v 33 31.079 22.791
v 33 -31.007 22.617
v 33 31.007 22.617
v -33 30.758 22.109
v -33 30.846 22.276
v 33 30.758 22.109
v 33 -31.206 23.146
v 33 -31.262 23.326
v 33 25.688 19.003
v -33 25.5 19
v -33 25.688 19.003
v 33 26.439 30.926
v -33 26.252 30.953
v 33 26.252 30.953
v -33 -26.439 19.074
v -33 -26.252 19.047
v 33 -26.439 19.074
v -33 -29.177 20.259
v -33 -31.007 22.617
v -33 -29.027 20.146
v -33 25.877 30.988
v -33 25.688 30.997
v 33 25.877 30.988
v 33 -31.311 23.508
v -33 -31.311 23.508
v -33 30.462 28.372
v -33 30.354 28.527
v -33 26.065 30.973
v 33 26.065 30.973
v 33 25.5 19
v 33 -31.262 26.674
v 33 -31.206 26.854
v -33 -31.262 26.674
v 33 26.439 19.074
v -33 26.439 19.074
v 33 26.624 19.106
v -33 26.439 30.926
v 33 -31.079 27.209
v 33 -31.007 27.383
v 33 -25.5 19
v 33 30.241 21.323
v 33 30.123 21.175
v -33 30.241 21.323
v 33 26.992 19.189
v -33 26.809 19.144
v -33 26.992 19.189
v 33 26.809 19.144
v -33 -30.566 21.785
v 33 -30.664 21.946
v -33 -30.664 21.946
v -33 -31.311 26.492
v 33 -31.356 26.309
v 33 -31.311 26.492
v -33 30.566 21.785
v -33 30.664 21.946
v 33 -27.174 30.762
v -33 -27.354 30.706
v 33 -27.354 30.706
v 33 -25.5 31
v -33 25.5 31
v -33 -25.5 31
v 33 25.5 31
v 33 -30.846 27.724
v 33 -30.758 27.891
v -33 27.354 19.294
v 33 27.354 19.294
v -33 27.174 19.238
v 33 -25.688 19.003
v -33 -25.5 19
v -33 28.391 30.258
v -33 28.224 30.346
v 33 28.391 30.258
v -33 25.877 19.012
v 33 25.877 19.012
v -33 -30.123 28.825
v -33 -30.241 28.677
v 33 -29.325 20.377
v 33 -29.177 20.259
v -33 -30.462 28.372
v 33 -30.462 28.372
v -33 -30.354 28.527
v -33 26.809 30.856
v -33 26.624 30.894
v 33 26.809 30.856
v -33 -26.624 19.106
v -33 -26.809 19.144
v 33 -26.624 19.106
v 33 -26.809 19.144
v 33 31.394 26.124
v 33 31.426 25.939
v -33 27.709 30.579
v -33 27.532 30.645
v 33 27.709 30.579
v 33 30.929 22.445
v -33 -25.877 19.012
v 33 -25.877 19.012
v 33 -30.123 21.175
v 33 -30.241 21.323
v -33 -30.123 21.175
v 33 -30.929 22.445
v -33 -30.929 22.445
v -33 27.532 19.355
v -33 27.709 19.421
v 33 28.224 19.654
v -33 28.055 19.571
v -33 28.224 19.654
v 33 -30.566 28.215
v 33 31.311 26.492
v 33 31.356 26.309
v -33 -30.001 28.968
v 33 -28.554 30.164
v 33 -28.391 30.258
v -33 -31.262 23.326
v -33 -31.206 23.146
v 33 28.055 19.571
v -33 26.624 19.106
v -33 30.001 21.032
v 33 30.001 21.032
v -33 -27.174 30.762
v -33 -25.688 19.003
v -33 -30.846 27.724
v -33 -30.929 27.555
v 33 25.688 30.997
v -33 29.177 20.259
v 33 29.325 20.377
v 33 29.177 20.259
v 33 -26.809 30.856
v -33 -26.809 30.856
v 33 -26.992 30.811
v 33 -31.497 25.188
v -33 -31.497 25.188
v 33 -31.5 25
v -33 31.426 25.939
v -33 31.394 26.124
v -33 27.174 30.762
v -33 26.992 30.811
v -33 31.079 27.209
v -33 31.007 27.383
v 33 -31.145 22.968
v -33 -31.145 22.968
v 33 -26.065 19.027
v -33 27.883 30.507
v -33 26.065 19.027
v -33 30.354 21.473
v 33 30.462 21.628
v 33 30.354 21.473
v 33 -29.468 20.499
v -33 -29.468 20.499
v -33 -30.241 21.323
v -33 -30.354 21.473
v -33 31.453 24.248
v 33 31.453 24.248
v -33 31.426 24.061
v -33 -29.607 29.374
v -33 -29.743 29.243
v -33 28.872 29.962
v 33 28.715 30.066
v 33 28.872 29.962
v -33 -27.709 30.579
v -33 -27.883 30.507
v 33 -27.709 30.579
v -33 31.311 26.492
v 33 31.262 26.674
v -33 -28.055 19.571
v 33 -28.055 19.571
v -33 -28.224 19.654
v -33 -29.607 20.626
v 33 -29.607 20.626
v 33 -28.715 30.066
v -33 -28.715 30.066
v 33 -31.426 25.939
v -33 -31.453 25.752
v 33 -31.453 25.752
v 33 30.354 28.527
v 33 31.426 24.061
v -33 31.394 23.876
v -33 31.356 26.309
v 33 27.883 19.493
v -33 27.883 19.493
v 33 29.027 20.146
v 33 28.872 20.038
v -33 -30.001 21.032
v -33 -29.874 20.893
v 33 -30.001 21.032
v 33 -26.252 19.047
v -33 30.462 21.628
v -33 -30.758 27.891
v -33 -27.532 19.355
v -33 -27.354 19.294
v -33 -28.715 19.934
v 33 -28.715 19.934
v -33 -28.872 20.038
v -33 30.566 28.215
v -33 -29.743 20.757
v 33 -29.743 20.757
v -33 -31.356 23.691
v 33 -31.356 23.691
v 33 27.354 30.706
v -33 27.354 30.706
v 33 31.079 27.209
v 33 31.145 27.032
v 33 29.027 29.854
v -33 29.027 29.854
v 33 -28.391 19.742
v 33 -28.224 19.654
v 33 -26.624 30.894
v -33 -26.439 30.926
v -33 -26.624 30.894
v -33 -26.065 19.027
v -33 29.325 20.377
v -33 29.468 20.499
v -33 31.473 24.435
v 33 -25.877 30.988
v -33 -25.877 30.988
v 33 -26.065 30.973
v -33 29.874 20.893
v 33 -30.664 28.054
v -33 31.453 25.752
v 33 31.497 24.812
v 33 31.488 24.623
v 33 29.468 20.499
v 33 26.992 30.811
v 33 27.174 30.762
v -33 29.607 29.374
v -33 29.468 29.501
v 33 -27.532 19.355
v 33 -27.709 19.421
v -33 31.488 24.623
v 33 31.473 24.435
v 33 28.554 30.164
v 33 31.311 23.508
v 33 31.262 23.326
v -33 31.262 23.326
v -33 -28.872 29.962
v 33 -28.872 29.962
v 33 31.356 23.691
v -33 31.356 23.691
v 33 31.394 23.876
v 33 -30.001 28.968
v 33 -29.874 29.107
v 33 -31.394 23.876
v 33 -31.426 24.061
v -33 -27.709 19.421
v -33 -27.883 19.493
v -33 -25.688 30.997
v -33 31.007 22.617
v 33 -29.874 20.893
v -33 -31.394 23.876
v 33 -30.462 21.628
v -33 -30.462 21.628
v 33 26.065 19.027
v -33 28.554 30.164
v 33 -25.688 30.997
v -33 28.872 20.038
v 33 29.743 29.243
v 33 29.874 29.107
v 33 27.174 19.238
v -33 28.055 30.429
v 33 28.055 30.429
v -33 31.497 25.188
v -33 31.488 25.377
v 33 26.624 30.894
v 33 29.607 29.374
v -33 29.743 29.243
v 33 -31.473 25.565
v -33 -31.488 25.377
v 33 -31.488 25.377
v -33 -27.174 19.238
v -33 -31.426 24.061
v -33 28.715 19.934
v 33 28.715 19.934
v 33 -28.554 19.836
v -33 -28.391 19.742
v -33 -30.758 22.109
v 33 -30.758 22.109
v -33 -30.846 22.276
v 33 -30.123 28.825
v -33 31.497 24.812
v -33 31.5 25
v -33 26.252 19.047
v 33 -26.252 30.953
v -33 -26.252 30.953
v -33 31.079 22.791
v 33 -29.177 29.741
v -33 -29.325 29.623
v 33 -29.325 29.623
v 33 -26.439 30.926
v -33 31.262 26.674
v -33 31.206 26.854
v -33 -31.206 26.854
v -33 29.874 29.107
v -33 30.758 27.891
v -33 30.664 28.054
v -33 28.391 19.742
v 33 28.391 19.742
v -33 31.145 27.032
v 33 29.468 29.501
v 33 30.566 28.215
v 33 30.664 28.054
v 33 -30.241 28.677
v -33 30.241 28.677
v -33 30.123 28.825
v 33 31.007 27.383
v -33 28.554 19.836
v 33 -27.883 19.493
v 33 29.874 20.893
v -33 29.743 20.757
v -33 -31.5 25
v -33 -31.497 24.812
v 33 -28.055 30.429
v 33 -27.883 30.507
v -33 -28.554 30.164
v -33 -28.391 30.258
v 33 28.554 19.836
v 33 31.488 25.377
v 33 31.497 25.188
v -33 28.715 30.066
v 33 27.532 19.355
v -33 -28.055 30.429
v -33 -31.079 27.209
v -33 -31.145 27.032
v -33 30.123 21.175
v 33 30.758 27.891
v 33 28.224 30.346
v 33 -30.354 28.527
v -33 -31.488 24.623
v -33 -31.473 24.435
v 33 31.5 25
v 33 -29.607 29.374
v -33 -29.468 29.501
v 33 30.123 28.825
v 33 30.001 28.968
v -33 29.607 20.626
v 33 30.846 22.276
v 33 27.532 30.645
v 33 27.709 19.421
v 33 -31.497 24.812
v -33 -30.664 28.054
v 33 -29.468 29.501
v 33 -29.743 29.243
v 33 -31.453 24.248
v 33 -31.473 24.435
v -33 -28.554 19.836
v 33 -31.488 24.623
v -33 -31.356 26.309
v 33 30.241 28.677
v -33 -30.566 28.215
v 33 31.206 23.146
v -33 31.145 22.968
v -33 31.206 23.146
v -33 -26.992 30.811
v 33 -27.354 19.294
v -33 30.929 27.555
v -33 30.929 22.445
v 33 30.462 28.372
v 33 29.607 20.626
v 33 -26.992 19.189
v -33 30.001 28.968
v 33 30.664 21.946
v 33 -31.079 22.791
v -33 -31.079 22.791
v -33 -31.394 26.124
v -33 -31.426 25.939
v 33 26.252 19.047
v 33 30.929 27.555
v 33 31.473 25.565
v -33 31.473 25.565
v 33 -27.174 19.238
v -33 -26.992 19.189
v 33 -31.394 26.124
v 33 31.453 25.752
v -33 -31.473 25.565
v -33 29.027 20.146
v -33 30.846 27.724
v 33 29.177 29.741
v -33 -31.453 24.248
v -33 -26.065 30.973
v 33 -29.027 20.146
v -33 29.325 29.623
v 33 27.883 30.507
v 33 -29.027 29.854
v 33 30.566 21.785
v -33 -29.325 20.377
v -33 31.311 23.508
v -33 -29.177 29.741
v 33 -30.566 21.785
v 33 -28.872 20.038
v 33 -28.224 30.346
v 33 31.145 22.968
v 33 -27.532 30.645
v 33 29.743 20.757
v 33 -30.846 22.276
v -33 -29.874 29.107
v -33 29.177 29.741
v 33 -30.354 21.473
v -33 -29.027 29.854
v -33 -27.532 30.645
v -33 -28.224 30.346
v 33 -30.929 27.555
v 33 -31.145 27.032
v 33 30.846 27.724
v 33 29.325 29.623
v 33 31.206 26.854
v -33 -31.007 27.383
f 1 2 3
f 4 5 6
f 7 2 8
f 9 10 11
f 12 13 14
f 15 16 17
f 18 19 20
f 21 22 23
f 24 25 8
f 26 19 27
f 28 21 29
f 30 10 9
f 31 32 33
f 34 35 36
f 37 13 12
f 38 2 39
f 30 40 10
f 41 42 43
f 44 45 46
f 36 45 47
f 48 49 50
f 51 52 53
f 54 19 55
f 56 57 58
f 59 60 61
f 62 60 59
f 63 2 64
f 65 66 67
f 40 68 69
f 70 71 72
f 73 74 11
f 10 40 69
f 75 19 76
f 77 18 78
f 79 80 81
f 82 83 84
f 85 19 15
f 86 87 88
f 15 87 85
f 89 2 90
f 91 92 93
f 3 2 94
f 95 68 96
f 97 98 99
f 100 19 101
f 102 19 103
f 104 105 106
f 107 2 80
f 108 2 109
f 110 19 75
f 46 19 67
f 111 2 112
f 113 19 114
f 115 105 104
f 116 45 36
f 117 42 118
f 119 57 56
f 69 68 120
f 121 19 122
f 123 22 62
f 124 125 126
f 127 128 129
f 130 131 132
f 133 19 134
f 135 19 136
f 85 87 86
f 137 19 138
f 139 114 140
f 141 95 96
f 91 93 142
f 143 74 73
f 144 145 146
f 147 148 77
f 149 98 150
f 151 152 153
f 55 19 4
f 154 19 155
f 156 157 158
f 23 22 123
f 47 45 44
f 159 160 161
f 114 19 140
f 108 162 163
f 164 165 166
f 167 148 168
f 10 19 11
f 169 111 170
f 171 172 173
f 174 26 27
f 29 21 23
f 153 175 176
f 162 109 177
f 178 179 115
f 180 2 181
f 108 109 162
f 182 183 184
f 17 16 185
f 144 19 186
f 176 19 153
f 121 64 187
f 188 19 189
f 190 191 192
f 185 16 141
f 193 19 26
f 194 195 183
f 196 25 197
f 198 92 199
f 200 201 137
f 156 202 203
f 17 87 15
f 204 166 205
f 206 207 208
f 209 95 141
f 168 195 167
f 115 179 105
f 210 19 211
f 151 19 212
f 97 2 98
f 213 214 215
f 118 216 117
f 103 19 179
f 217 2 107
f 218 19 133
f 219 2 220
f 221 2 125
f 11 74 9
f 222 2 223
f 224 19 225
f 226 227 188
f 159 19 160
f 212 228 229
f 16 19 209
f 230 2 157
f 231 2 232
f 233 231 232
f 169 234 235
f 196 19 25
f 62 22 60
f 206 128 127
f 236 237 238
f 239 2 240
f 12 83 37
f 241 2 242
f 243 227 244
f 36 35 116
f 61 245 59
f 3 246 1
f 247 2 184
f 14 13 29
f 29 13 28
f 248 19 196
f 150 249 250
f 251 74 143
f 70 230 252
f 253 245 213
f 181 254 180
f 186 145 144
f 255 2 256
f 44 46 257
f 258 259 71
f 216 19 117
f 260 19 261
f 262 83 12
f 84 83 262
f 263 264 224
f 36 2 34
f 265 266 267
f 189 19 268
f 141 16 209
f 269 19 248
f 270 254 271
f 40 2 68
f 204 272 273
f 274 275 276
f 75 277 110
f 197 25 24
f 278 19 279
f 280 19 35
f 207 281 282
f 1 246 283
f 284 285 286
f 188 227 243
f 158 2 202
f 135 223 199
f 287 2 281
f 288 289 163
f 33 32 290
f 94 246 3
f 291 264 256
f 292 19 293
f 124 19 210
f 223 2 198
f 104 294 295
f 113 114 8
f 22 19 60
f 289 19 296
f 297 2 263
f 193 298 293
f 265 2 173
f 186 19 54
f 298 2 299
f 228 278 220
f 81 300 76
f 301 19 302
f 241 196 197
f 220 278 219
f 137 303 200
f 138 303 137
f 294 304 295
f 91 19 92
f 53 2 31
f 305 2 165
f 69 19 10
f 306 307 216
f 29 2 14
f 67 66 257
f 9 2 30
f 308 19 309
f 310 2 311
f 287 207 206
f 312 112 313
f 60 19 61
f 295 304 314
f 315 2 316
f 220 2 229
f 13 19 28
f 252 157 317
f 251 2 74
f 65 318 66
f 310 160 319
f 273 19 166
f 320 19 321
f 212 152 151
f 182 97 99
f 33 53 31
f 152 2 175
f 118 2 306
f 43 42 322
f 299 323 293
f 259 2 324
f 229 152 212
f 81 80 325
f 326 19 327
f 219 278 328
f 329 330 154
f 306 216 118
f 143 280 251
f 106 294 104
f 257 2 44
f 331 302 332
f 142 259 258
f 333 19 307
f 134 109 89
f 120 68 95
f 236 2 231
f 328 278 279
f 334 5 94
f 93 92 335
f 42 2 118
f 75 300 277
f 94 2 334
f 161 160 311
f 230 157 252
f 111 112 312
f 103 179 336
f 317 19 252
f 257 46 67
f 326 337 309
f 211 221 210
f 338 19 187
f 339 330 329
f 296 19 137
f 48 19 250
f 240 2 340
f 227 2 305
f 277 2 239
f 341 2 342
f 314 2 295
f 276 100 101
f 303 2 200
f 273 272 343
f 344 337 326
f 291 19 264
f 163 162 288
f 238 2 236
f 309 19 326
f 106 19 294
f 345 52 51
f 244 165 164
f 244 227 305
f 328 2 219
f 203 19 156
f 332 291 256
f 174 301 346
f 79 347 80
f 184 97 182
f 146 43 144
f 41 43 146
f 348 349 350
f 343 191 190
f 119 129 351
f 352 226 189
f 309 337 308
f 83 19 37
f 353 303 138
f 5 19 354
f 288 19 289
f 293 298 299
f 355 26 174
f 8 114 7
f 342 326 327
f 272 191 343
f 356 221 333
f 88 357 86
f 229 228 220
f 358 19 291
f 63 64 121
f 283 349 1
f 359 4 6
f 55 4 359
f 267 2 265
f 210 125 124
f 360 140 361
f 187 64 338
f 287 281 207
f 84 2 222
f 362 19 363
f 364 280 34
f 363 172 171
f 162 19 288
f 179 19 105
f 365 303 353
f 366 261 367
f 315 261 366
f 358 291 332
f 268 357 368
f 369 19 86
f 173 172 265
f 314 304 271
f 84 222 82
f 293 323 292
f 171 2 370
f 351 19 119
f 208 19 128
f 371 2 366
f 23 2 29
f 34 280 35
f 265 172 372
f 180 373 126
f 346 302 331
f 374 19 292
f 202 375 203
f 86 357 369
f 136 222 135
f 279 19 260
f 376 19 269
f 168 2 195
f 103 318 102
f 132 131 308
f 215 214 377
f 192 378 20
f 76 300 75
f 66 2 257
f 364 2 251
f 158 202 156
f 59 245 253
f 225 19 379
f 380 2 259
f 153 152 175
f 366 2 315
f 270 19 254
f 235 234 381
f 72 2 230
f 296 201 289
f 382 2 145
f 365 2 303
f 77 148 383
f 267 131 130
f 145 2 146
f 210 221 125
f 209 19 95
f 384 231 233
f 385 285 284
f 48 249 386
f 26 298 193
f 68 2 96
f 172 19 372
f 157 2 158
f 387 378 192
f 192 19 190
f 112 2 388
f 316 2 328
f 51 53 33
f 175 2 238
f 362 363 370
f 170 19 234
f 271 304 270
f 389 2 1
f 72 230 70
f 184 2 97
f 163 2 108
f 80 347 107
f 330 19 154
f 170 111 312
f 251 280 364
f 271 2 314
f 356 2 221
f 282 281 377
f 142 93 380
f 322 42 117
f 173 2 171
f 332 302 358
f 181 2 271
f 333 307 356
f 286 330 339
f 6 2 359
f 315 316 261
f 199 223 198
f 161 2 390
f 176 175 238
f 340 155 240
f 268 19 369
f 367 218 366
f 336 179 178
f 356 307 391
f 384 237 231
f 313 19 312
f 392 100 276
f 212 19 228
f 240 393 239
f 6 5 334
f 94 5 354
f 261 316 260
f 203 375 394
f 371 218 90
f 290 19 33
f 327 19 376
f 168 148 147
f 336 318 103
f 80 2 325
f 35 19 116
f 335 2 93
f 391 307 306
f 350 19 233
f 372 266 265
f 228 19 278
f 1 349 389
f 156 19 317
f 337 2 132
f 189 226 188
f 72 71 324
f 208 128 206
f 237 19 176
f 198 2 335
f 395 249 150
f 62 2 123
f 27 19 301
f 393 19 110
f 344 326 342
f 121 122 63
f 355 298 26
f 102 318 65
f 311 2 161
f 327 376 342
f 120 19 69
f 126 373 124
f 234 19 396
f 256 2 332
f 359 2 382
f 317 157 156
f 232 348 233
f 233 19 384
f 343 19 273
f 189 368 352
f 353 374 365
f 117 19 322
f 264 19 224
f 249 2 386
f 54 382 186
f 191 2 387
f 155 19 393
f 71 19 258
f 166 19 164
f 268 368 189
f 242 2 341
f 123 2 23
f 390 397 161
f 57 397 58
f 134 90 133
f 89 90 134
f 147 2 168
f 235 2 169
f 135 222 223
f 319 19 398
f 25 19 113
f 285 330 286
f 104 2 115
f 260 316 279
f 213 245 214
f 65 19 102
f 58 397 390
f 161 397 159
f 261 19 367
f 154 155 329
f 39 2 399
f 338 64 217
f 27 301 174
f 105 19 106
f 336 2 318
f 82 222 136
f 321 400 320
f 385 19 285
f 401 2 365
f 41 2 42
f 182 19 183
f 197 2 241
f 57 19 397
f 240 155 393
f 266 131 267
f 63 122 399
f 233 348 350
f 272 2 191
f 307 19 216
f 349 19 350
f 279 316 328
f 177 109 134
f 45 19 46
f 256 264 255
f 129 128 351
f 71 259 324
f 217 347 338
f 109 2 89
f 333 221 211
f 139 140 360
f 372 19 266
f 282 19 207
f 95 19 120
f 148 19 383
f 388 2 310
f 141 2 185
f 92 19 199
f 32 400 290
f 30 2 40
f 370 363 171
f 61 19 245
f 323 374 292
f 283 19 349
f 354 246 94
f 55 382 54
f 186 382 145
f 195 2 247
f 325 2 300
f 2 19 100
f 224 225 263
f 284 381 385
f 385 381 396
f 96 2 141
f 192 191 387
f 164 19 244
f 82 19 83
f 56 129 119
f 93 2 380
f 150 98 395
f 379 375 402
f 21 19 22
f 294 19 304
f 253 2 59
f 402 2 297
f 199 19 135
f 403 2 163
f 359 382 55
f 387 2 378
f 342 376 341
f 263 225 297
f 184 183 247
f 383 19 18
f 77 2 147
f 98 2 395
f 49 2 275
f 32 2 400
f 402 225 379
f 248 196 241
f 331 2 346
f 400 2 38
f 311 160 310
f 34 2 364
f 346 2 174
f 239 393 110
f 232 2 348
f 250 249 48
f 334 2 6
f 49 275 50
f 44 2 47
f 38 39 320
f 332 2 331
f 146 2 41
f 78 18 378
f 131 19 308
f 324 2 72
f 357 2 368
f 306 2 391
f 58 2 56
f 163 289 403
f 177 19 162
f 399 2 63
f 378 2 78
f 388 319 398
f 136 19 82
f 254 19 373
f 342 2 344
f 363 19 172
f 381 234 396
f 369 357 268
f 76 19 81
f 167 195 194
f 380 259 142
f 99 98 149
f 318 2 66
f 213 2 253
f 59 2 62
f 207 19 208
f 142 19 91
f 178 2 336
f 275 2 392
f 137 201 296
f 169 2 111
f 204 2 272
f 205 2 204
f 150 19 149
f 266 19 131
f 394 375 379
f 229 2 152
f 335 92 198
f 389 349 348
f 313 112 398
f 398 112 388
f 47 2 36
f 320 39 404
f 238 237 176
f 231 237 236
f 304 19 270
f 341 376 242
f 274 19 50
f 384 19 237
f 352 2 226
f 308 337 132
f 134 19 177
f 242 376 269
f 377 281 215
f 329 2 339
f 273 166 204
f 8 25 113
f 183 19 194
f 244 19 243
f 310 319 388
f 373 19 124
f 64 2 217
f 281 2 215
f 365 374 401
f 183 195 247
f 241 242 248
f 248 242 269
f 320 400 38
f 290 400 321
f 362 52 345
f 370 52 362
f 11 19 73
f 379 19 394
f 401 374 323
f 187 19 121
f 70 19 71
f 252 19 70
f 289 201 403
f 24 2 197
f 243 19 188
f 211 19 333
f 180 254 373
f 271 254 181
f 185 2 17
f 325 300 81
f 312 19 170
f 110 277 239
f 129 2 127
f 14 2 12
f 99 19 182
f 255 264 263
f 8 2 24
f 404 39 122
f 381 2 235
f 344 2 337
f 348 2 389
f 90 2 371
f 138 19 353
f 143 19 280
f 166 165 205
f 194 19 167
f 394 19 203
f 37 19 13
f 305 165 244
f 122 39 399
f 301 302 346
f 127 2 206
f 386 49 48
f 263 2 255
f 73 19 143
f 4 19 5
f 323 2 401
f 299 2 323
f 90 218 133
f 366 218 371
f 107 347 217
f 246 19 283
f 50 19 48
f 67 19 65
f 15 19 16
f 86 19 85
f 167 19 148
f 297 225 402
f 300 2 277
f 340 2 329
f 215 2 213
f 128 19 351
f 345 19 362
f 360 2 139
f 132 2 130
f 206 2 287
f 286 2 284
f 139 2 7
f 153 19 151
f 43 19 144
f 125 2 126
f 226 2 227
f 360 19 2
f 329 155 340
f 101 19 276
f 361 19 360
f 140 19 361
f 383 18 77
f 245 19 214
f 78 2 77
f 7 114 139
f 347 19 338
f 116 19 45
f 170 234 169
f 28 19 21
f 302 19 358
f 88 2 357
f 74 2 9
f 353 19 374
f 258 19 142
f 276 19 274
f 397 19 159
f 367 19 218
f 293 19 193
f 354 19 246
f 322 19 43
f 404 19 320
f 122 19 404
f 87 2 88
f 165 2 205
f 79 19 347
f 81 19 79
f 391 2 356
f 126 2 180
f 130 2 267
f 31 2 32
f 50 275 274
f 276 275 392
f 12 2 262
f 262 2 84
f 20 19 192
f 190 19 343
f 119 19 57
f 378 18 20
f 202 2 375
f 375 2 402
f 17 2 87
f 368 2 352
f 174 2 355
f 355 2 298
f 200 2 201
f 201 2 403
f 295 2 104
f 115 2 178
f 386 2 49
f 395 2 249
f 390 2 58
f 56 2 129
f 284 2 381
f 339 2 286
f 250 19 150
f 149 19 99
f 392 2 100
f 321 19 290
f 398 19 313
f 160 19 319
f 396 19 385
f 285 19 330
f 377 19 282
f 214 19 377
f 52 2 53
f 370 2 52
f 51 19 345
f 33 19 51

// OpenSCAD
$fn=200;


slot();

module slot(){
    
      translate([-33,0,0]){
          hull(){
          #translate([0,25.5,25]) rotate([0,90,0]) cylinder( r=6,h=66);
          #translate([0,-25.5,25]) rotate([0,90,0]) cylinder( r=6,h=66);
      }
  }
  }
  
  
          
